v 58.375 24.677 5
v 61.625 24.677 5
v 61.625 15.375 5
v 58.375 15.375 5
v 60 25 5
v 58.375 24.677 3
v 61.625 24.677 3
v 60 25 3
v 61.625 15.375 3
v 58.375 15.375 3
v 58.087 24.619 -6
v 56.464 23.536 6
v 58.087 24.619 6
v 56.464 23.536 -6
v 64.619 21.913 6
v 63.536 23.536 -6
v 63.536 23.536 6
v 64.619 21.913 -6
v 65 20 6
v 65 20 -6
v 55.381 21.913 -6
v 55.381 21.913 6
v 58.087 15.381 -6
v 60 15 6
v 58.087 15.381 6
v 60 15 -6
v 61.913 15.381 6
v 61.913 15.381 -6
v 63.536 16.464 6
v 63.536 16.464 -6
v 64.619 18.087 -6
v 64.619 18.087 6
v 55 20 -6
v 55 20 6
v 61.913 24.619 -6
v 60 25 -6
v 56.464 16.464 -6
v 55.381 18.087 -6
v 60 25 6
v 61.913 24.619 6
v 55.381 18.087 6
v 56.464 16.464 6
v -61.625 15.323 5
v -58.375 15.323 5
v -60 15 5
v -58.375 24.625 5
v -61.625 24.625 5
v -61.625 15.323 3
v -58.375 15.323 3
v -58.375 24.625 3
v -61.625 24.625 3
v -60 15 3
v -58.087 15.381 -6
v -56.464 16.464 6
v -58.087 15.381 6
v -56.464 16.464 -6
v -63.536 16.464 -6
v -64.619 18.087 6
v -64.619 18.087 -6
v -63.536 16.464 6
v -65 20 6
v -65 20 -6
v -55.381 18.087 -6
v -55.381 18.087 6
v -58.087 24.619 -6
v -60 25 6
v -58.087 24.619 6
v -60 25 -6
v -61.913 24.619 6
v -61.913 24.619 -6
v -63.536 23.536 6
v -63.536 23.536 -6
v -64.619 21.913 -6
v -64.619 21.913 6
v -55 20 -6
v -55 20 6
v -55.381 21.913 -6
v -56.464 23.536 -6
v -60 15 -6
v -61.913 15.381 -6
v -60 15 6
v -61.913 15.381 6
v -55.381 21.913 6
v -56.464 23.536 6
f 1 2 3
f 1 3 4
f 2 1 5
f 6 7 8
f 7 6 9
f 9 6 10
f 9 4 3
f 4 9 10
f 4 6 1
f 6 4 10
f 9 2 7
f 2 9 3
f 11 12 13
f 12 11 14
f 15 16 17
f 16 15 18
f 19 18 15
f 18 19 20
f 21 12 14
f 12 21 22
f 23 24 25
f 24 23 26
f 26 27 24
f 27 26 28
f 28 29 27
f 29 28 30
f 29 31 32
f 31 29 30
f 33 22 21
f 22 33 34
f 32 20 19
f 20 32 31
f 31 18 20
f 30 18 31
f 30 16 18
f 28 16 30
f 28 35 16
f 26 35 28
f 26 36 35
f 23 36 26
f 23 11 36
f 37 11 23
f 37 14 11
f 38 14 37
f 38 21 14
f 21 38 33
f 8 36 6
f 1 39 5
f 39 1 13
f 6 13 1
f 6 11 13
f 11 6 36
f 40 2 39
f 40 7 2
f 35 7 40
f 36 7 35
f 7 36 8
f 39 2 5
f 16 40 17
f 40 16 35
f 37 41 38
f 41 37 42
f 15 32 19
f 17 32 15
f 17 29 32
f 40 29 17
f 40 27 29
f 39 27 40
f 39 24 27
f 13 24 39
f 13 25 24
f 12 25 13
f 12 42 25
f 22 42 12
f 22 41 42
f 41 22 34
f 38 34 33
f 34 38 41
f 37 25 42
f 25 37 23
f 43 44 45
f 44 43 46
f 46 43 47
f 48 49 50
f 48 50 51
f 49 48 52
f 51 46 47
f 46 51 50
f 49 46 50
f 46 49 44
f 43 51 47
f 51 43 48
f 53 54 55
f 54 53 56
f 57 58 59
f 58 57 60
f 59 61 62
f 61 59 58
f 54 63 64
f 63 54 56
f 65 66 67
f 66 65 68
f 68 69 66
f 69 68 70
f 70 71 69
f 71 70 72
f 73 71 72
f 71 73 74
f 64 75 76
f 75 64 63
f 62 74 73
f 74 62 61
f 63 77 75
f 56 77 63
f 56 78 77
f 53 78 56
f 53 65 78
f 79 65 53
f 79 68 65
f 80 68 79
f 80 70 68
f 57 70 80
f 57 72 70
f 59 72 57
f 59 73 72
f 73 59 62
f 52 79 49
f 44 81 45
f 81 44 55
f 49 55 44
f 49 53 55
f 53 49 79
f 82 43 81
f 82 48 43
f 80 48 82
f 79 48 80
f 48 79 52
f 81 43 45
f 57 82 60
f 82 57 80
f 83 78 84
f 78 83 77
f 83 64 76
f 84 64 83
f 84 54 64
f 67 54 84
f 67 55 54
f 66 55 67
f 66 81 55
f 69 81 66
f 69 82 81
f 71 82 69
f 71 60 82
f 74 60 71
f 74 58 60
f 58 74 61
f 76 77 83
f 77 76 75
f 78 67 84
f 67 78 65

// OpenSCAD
//////////////////////////////////////////////////////////////////
// This module is used for generating the peg cutouts and pegs. //
//////////////////////////////////////////////////////////////////

// peg_space: This controls the X-axis space between the pegs.
// number_of_pegs: This defines the number of pegs to generate.
// peg_height: This defines the Z-axis height of the peg.
// peg_radius: This determines the diameter/circumferance of each peg.
// peg_y_position: This determines the Y-axis position of the pegs.

// This generates the GREEN peg clip.
module peg_connector_clip(connector_clip_x, connector_clip_y, connector_clip_z) {
    color("green")
    cube([connector_clip_x, connector_clip_y, connector_clip_z],true);
    translate([connector_clip_y+2,0,.25])
    cube([2,5,2.5],true);
}

// This generates the WHITE hole size in the Blue peg so the GREEN clip can slide in.
module peg_connector_hole(connector_clip_x, connector_clip_y, connector_clip_z) {
    color("white")
    peg_connector_clip(connector_clip_x+.25, connector_clip_y+.25, connector_clip_z);
}

// This module combines and diffs the WHITE hole from the BLUE peg.
module peg(peg_height, peg_radius, connector_clip_x, connector_clip_y, connector_clip_z) {
    difference() {
        // This generates the BLUE peg.
        color("blue")
        cylinder(h = peg_height, r1 = peg_radius, r2 = peg_radius, center = true);
        
        // This is the WHITE peg Hole.
        rotate([0,0,90])
        translate([2, 0, +4])
        peg_connector_hole(connector_clip_x, connector_clip_y, connector_clip_z);
    }
}

// This module generates "number_of_pegs" at "pegs_space" in millimeters apart.
module holder_pegs(peg_space, number_of_pegs, peg_height, peg_radius, connector_clip_x, connector_clip_y, connector_clip_z) {
    for (i=[0: 360/number_of_pegs: 360])
        rotate([0,0,i])
        translate([peg_space,0,0])
        peg(peg_height, peg_radius, connector_clip_x, connector_clip_y, connector_clip_z);
}


peg_y_position=20;

translate([0,peg_y_position,0])
holder_pegs(peg_space=60,
            number_of_pegs=2,
            peg_height=12,
            peg_radius=5,
            connector_clip_x=13,
            connector_clip_y=3,
            connector_clip_z=2);

//translate([0,-peg_y_position,0])
//holder_pegs(peg_space=60,
//            number_of_pegs=2,
//            peg_height=12,
//            peg_radius=5,
//            connector_clip_x=10,
//            connector_clip_y=3,
//            connector_clip_z=2);

//peg_connector_clip(connector_clip_x=10,
//                   connector_clip_y=3,
//                   connector_clip_z=2);
